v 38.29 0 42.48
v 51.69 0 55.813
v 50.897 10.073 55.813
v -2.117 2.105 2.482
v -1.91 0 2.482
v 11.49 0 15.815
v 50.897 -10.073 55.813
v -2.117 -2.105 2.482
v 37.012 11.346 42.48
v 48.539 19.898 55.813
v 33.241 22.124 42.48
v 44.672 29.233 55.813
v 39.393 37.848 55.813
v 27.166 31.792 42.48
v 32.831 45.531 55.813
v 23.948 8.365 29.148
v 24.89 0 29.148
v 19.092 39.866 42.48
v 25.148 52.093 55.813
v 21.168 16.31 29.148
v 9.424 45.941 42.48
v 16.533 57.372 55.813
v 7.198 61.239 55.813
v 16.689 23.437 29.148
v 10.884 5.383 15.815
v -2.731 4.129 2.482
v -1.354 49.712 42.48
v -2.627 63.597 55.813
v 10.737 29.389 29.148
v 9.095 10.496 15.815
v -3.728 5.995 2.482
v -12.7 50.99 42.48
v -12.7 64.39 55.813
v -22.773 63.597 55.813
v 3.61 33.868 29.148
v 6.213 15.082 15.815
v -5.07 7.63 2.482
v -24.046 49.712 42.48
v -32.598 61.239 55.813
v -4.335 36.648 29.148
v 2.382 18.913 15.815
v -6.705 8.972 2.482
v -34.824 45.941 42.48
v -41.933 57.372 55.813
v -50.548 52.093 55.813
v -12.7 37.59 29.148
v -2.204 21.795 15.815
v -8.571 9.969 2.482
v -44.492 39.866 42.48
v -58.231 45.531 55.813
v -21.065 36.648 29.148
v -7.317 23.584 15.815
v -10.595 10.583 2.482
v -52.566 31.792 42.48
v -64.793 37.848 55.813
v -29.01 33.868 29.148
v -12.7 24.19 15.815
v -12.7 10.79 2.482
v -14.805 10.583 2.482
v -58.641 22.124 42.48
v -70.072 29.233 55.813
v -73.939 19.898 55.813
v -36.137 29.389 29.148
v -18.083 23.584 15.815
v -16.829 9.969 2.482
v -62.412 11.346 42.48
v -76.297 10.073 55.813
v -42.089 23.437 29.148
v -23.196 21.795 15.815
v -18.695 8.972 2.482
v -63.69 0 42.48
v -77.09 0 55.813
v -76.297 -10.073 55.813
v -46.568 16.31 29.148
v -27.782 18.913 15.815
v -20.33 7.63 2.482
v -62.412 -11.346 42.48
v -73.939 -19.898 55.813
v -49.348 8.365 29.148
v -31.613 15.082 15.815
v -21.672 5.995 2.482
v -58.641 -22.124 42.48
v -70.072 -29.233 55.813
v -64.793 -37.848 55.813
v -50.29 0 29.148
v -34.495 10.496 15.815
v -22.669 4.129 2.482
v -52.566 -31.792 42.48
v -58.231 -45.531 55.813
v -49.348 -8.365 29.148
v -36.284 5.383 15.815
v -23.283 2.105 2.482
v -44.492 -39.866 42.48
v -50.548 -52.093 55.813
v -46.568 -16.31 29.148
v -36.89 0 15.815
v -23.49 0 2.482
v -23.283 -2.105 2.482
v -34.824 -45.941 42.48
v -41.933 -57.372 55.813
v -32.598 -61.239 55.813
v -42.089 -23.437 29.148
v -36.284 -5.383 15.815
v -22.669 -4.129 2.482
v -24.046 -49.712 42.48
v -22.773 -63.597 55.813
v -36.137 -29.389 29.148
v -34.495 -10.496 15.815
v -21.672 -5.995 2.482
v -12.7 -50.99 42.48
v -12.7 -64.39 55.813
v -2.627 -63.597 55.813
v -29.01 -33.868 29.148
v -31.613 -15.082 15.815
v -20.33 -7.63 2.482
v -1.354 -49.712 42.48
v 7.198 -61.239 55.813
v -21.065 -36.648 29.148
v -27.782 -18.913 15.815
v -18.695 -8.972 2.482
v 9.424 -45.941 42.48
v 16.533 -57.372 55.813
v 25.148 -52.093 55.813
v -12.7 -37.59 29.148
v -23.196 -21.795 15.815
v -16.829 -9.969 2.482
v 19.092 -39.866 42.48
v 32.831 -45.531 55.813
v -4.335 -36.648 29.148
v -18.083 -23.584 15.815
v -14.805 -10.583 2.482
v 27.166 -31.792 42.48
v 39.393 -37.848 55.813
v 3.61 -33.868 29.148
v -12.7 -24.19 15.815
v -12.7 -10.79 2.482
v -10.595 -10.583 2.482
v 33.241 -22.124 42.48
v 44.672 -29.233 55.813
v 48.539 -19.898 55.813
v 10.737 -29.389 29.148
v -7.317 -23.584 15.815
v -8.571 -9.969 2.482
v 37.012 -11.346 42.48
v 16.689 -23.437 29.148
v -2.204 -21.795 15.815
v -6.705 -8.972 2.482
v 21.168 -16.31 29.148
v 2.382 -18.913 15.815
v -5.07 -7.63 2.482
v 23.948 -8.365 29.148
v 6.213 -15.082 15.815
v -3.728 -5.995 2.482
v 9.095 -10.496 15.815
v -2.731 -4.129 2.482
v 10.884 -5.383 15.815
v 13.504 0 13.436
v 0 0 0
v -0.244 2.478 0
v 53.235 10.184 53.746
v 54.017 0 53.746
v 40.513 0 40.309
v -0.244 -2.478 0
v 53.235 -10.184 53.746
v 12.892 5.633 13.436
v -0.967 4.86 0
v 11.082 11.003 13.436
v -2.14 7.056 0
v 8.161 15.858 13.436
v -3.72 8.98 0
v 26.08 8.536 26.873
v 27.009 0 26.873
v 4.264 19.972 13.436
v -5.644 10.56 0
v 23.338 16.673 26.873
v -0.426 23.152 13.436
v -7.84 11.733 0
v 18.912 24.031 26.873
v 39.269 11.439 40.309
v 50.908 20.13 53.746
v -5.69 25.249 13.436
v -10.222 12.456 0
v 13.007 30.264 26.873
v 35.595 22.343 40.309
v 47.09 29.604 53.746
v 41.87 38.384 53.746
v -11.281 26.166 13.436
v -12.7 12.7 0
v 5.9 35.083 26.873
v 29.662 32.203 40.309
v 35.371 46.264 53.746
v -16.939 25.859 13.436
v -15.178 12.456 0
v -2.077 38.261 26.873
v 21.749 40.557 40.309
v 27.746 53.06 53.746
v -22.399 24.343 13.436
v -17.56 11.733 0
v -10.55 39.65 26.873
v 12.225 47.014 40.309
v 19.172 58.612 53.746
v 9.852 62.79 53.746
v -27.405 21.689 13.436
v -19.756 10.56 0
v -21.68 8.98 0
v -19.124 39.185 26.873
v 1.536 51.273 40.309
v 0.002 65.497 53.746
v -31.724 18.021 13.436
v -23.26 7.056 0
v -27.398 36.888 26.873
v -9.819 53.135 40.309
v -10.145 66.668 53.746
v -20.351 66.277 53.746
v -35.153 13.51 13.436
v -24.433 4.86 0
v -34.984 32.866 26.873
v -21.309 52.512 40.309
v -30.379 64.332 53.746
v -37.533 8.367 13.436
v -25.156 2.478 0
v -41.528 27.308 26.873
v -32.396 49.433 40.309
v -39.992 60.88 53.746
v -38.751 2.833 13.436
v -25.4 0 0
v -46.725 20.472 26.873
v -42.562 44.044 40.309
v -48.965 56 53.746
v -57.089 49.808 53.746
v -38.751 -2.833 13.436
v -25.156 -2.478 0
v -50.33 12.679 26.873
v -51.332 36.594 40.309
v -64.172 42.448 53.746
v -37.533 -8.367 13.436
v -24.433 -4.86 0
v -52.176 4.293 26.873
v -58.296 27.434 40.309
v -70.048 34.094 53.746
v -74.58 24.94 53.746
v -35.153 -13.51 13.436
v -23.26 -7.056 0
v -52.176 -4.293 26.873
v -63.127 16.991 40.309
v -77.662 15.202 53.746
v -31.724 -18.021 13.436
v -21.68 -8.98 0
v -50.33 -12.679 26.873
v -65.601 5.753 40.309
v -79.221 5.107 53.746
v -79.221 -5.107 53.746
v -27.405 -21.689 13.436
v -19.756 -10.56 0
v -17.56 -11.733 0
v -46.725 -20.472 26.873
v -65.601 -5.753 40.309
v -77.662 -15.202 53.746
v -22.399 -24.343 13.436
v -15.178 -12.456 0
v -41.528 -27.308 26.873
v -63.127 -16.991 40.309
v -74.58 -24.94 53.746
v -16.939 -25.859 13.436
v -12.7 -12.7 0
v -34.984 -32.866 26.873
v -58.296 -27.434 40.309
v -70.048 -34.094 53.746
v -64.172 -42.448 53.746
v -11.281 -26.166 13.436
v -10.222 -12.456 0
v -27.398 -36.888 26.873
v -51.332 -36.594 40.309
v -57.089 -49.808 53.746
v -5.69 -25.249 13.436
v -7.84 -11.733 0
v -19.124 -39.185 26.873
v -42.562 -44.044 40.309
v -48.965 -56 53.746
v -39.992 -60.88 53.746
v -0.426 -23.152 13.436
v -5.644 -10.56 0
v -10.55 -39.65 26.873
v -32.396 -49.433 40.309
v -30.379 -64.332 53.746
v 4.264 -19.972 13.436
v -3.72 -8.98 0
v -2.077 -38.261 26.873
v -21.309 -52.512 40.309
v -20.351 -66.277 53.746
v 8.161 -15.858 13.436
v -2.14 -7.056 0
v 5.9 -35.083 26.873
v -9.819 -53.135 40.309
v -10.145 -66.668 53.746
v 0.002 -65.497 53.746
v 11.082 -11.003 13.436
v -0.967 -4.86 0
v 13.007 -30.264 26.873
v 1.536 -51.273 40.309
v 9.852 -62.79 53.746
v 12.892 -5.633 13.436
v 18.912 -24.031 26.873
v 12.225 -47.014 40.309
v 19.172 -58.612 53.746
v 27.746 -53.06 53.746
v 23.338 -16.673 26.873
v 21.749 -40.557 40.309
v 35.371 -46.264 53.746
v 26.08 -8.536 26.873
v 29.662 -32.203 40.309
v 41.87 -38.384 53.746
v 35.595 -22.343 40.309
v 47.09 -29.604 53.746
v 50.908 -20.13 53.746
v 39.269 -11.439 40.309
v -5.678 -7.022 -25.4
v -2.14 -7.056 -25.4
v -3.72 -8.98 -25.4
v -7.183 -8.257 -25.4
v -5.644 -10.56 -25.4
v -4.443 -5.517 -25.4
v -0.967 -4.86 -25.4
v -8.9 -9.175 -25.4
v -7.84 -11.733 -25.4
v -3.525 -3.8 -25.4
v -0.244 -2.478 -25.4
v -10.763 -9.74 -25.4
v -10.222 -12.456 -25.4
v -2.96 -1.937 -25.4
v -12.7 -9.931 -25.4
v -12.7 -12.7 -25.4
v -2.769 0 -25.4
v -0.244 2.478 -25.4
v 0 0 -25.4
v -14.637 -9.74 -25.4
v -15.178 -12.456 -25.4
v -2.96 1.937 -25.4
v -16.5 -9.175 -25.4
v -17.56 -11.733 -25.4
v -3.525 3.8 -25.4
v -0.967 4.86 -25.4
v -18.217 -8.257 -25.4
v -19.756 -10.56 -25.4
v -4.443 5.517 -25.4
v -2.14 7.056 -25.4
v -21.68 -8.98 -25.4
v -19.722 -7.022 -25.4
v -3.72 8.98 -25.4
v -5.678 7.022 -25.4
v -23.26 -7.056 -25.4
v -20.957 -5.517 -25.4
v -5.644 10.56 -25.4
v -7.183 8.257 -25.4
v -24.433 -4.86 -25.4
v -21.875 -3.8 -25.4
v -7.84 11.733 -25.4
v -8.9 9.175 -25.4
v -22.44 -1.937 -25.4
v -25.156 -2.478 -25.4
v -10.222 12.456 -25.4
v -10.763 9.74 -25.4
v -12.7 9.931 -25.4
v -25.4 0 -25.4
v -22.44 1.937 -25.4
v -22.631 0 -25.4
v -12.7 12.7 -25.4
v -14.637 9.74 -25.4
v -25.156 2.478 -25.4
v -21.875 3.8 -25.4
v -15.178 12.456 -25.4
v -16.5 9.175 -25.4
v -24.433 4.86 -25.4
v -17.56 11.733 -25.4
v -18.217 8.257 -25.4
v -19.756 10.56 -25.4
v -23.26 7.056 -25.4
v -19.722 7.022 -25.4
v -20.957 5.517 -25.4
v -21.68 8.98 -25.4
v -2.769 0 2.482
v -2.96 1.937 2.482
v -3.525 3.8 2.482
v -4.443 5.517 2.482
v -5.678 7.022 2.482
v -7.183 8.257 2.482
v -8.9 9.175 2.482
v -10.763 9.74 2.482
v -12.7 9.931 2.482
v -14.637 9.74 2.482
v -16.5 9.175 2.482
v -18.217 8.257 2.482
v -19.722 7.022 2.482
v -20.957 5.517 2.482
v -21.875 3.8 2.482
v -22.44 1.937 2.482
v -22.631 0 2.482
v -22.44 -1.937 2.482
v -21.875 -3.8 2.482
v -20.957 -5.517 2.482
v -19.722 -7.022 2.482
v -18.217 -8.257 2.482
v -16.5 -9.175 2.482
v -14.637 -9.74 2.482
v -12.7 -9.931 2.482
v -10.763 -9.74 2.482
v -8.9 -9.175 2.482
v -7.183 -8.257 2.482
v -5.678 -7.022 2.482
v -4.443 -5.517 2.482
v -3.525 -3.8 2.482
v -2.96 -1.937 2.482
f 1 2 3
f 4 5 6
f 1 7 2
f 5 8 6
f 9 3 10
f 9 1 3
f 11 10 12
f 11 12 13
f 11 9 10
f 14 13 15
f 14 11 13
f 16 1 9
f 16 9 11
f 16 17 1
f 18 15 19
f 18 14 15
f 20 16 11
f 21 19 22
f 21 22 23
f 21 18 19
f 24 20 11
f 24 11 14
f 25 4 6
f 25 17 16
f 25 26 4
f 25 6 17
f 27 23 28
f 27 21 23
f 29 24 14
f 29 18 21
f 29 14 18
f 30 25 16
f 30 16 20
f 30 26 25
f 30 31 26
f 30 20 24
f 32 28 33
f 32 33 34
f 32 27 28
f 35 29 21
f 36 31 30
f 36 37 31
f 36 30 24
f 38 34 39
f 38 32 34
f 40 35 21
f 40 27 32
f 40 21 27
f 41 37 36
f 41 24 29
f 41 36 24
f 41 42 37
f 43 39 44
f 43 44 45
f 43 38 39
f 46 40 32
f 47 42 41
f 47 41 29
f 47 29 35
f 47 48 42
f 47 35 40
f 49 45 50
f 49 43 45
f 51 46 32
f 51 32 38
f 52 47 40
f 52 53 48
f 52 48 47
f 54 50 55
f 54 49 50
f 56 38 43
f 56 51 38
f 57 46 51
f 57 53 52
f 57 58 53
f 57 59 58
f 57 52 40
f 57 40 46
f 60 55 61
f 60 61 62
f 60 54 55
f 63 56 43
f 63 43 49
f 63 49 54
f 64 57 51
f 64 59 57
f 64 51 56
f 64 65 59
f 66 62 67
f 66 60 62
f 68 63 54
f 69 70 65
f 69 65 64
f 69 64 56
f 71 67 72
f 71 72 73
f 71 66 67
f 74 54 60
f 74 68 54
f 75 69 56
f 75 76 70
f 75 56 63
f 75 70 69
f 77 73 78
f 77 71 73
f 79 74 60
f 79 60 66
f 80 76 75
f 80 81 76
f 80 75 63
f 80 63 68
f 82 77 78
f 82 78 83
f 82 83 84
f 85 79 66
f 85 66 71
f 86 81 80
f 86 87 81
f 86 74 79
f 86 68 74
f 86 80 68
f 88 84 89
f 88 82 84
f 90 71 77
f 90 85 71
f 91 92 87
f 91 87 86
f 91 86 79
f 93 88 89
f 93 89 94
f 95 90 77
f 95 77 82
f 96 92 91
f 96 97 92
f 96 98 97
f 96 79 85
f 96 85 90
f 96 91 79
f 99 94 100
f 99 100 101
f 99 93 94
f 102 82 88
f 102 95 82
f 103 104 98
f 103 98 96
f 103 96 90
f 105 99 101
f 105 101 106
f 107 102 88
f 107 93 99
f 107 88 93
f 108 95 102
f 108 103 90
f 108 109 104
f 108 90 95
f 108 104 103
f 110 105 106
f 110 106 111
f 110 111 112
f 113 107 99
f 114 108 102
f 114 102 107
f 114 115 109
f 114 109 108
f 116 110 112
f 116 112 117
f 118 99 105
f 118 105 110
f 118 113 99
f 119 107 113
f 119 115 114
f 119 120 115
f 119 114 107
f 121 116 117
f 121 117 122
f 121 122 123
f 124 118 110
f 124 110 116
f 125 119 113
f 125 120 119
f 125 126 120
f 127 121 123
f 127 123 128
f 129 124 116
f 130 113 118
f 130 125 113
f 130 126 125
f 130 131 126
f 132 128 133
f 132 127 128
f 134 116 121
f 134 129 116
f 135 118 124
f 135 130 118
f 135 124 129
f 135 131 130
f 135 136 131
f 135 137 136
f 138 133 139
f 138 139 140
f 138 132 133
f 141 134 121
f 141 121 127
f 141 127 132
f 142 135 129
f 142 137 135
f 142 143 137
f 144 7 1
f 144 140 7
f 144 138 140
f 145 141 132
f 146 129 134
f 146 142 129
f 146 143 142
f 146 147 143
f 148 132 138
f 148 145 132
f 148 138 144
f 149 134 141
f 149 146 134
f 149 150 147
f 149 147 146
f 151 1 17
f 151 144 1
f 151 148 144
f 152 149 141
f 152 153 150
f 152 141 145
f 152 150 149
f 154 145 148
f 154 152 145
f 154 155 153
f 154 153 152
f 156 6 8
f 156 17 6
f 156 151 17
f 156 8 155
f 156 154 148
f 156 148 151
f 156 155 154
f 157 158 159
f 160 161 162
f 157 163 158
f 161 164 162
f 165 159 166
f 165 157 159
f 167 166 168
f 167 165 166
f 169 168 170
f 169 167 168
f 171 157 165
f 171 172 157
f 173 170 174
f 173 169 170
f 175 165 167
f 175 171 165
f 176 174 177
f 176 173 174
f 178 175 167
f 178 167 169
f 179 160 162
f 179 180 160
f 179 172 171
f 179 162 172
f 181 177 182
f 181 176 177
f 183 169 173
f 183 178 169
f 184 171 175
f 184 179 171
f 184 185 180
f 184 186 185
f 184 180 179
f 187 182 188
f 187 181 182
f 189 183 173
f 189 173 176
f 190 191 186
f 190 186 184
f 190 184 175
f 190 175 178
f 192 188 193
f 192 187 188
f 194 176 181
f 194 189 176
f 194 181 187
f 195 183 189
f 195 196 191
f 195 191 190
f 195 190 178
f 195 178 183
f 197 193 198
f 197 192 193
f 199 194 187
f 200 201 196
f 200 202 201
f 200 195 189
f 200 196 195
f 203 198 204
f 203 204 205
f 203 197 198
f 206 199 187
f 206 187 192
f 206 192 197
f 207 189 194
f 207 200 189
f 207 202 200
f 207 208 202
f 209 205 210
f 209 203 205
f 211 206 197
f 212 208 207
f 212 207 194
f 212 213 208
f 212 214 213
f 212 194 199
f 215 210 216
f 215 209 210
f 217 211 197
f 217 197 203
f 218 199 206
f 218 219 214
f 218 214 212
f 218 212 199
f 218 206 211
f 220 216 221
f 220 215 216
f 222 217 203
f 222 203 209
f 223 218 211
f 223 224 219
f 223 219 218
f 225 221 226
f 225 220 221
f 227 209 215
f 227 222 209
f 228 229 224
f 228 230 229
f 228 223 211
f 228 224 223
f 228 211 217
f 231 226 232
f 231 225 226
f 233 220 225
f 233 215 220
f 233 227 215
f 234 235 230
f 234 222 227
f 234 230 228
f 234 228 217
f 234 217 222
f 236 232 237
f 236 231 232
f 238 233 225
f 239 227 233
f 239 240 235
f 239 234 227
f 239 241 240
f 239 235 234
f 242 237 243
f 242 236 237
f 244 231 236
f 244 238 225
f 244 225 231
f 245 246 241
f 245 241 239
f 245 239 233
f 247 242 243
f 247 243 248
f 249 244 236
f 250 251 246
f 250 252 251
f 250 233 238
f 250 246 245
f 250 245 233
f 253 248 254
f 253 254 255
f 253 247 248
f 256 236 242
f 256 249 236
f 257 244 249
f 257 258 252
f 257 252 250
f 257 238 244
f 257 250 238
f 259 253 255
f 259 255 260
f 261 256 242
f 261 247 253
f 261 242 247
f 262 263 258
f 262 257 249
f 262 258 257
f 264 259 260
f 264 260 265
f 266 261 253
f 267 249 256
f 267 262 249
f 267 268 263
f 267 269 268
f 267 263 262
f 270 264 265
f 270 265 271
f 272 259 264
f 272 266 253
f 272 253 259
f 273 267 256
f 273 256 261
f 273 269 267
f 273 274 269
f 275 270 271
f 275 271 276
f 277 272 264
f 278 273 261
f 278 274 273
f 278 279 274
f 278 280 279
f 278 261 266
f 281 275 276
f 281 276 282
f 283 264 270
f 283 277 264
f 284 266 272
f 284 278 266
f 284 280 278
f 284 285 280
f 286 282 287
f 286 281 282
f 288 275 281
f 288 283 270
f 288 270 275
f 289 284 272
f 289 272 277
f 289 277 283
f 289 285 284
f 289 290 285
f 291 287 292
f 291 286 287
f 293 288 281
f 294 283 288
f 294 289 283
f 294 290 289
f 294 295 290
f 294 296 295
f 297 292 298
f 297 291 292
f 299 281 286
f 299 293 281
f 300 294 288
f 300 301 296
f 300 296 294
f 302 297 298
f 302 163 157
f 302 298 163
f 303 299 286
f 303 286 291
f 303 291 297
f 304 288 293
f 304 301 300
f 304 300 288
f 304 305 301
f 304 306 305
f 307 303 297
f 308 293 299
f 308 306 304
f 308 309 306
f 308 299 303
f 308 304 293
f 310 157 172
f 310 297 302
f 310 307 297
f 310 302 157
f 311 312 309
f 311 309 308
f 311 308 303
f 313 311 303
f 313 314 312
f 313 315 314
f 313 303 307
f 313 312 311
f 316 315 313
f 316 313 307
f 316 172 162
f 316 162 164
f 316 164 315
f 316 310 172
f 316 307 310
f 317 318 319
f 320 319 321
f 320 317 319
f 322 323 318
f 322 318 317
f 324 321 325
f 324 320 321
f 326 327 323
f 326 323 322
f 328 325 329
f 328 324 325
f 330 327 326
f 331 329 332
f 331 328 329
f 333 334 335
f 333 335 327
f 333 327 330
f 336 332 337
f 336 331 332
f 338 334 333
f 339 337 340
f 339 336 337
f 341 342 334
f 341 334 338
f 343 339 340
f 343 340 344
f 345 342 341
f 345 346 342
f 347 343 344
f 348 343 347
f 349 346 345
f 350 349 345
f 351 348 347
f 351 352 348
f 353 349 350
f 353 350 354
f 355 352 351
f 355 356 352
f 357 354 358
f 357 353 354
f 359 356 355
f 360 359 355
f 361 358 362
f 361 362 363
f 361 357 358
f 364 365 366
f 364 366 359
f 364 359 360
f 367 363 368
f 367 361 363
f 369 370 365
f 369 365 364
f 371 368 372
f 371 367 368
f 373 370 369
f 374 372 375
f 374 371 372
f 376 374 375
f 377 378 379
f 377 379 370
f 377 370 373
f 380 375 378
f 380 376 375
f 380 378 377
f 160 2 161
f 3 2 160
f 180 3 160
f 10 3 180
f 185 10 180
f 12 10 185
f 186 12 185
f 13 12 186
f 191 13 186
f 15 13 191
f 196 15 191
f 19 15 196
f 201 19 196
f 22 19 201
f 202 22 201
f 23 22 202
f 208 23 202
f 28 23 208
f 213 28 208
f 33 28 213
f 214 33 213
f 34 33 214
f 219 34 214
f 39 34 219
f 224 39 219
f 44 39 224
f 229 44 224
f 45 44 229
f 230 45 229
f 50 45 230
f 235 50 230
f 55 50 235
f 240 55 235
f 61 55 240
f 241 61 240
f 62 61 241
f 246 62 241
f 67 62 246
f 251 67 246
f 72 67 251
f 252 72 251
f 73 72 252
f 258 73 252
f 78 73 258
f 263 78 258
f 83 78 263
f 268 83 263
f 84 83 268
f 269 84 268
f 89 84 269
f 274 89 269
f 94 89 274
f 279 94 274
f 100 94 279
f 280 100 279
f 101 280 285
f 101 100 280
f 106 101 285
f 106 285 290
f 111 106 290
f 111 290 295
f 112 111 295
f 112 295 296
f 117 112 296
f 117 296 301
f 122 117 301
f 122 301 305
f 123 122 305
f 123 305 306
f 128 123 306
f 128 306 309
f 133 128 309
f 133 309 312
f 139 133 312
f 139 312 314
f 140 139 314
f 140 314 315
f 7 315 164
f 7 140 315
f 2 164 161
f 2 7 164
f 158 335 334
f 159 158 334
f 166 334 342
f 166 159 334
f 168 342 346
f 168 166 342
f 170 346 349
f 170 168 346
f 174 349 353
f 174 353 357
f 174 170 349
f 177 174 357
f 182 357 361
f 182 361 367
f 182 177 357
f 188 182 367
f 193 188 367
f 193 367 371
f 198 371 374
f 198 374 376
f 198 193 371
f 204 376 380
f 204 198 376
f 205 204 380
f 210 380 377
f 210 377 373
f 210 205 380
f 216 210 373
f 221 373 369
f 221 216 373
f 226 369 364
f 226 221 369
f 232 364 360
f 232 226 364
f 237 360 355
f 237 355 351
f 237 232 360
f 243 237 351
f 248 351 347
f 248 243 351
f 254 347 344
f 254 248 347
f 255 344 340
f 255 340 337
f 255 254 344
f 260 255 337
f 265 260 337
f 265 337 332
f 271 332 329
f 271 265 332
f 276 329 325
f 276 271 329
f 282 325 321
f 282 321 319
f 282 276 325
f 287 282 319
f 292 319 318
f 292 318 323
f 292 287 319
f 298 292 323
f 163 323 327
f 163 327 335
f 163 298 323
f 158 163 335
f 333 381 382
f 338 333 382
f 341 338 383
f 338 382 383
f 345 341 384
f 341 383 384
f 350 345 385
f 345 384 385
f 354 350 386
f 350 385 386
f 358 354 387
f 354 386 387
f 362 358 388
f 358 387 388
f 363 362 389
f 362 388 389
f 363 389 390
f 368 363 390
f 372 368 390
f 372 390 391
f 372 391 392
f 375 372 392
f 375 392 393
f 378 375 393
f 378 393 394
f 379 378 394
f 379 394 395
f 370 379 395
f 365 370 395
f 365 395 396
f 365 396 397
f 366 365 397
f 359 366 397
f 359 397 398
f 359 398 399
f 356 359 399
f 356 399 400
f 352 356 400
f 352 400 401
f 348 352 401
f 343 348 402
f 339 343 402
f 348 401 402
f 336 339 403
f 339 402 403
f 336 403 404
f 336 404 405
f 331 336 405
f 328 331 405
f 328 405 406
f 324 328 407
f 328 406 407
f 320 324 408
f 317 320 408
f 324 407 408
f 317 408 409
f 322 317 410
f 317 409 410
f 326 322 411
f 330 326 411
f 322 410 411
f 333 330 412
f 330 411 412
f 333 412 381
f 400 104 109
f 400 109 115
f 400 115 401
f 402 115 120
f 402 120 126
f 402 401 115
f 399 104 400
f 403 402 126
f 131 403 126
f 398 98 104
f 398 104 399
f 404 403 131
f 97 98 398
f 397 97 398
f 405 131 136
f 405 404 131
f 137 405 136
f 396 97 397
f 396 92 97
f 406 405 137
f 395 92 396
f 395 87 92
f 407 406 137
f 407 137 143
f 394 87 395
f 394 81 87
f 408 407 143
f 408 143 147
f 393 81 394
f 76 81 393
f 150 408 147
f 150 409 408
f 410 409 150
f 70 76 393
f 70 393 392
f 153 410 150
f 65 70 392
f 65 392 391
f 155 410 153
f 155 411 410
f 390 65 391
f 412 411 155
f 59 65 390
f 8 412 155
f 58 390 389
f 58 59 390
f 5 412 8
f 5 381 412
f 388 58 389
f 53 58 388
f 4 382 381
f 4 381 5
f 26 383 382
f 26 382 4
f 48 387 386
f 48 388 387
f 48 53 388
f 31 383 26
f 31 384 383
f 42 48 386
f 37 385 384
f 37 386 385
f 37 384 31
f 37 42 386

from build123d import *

# Parameters (mm, degrees)
F2_R     = 9.931182
F3_DEPTH = 50.8


with BuildPart() as f1:
    # F0 (on Front) → F1 (revolve)
    with BuildSketch(Plane.XZ):
        Polygon((0, -25.4), (0, 0), (54.017087, 53.745644), (51.690166, 55.812778), (-1.909546, 2.482411), (-12.7, 2.482411), (-12.7, -25.4), align=None)
    revolve(axis=Axis((-12.7, 0, -11.458795), (0, 0, 1)))

    # F2 (on face) → F3 (cut)
    with BuildSketch(Plane.XY.offset(2.482411)):
        with Locations((-12.7, 0)):
            Circle(F2_R)
    extrude(amount=-F3_DEPTH, mode=Mode.SUBTRACT)


solid = f1.part
